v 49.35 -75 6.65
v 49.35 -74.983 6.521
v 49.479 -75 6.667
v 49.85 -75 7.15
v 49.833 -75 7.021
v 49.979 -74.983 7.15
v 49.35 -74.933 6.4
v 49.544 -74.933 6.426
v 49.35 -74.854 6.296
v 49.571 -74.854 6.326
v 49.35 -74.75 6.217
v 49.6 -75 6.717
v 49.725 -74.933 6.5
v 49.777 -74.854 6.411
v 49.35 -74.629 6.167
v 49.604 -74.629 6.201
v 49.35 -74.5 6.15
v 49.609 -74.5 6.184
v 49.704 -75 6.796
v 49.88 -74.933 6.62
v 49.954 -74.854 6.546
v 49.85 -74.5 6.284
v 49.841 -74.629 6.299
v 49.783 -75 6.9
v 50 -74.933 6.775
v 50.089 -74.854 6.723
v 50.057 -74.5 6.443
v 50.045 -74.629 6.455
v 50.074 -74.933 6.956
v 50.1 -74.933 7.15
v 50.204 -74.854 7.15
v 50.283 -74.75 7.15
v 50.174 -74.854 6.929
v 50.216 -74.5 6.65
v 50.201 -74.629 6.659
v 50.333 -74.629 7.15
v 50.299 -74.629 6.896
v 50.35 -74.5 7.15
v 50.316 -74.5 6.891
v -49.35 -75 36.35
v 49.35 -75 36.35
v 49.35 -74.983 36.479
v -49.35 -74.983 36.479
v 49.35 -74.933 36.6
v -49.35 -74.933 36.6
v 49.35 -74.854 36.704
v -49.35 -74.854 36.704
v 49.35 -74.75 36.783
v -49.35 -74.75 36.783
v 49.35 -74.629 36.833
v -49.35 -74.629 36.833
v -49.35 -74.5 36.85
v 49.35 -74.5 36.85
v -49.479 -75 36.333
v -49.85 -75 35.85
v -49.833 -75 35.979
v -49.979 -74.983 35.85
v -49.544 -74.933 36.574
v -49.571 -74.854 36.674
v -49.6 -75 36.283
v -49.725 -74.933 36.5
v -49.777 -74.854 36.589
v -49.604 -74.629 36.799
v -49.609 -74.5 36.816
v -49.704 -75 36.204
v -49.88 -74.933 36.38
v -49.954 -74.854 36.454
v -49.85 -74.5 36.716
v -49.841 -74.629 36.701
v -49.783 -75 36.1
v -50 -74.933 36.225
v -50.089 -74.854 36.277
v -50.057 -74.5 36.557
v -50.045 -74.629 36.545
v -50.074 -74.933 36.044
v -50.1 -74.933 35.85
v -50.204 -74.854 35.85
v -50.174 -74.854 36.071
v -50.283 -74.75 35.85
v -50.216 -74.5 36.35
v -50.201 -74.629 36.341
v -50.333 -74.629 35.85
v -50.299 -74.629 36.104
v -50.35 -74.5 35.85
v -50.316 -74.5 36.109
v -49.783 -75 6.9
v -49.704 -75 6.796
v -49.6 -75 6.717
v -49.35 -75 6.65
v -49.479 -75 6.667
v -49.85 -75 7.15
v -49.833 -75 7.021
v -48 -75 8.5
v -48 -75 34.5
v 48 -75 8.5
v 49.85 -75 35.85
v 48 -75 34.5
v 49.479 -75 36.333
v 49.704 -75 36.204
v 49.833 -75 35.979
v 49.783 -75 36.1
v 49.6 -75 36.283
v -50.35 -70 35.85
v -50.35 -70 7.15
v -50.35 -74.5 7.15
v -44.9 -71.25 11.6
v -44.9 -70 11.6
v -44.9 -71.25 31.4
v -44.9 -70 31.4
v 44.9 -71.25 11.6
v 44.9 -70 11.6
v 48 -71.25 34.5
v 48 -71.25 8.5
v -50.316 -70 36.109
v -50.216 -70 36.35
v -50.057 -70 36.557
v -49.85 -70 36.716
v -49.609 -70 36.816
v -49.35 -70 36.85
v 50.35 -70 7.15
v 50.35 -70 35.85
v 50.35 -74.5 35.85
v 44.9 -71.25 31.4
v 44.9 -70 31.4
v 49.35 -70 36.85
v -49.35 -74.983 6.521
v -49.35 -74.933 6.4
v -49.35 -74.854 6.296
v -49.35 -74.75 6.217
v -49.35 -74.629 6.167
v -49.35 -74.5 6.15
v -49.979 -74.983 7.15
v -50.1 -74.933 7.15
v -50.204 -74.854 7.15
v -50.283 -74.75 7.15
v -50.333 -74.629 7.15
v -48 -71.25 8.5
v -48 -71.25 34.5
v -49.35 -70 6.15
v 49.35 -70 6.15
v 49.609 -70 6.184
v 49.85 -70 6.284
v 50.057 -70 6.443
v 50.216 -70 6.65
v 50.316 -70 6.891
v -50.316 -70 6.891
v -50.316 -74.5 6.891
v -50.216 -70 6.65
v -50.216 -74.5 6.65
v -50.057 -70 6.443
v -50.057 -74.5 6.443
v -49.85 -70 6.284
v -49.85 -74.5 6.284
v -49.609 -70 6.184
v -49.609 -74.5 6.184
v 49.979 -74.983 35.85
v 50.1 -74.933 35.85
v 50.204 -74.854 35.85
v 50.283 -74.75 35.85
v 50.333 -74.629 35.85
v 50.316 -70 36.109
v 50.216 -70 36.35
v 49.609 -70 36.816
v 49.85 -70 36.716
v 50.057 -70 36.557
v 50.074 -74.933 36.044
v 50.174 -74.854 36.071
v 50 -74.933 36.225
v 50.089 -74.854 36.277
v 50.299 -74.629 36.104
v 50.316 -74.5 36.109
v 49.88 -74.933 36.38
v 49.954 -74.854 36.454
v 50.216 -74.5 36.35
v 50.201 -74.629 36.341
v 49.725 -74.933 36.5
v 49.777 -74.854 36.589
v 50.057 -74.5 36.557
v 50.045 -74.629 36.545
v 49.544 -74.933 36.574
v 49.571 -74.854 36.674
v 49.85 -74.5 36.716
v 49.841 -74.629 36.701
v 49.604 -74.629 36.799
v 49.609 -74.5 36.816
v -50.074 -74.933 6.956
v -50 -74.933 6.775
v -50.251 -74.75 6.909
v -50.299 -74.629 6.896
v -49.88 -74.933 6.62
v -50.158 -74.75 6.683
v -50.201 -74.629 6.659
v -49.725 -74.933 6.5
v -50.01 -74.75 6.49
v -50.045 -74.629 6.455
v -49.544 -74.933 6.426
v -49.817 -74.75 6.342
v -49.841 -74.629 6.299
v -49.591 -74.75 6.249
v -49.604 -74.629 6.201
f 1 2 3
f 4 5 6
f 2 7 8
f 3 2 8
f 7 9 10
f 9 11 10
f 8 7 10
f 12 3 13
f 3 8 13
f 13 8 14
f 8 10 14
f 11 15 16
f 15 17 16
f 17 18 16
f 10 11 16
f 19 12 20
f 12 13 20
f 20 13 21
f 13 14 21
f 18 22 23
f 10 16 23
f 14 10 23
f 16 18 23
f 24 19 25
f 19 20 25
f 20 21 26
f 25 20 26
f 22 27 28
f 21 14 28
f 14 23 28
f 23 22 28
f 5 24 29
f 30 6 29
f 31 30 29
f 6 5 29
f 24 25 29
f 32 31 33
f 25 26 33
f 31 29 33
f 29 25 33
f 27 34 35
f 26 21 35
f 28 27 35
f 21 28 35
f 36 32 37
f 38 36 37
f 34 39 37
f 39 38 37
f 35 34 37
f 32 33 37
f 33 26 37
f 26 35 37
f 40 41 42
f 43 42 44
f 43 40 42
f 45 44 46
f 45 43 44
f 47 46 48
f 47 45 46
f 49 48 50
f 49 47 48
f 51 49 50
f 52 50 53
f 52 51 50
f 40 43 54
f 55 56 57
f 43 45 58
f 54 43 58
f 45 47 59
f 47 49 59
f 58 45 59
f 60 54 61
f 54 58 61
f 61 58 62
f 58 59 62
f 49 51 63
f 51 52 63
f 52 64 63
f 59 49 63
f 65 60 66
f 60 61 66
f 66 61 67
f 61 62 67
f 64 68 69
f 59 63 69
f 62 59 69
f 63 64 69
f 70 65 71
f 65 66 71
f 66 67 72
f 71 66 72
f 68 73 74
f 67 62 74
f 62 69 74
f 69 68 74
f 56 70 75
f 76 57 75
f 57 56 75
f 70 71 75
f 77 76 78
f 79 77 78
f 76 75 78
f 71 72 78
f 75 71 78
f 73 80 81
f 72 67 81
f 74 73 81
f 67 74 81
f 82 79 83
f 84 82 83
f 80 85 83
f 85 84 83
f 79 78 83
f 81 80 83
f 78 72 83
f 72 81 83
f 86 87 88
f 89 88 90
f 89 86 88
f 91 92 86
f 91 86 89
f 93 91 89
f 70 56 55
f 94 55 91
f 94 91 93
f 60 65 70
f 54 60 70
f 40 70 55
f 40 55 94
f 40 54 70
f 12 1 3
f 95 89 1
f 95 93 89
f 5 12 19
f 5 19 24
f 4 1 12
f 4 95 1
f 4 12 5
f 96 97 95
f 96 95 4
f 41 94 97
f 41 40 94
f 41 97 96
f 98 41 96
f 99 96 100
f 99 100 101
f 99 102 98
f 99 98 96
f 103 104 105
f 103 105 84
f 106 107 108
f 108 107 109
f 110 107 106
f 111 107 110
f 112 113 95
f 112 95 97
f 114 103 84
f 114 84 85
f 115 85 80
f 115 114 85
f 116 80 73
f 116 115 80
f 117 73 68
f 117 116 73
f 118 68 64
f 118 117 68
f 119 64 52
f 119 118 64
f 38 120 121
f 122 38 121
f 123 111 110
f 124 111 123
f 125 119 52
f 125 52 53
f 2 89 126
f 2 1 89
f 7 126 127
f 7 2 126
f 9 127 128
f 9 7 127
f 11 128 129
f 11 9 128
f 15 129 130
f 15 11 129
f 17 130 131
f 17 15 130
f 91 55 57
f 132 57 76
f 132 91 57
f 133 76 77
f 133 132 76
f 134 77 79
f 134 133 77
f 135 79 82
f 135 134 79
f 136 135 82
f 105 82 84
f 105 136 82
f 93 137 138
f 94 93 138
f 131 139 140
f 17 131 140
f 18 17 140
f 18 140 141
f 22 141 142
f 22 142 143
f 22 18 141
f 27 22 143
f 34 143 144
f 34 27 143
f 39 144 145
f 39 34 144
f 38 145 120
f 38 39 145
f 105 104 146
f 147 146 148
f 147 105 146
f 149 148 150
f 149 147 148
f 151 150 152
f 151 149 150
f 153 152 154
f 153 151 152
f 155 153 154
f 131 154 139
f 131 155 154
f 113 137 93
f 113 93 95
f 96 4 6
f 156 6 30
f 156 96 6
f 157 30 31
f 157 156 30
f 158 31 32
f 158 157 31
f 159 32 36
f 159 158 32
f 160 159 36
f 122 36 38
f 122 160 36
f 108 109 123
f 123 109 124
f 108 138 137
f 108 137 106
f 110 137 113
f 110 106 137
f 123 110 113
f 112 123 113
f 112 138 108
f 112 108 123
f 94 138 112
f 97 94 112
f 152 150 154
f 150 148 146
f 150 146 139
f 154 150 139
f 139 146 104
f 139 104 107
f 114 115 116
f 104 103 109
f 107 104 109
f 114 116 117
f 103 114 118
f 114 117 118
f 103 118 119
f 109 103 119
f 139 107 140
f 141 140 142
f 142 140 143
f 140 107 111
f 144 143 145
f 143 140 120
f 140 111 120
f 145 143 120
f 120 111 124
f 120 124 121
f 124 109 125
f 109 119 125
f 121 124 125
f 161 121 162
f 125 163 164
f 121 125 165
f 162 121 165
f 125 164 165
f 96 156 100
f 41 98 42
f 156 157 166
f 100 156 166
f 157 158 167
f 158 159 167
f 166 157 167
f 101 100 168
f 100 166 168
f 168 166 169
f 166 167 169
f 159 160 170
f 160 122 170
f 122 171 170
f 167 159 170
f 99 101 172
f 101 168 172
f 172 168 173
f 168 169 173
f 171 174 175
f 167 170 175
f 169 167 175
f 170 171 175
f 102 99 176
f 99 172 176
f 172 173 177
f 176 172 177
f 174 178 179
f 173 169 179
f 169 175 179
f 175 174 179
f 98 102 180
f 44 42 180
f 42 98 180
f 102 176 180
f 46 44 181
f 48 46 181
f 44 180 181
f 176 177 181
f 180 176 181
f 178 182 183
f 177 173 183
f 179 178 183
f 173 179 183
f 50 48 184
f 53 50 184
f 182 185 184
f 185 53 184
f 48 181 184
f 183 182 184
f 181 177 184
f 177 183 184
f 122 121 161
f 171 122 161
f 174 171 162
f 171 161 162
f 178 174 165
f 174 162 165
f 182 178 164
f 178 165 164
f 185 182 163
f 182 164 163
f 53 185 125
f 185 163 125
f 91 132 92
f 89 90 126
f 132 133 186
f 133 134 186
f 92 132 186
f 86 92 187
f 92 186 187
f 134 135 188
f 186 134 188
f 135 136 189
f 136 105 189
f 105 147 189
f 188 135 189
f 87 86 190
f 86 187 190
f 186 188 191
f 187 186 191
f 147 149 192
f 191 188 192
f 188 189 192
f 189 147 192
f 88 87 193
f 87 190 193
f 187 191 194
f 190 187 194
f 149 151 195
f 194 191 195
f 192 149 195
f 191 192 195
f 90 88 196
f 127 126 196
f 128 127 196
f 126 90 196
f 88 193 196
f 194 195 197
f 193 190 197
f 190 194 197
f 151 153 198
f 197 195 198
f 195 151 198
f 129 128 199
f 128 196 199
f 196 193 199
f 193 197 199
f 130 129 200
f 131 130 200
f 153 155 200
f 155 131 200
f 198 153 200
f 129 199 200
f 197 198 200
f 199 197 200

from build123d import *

# Parameters (mm, degrees)
SKETCH051_W   = 100.7
SKETCH051_H   = 30.7
SKETCH051_W_2 = 89.8
SKETCH051_H_2 = 19.8
PAD022_DEPTH  = 1.25
SKETCH052_W   = 100.7
SKETCH052_H   = 30.7
SKETCH052_W_2 = 96
SKETCH052_H_2 = 26
PAD023_DEPTH  = 3.75
FILLET_R      = 1
FILLET005_R   = 0.5


with BuildPart() as part:
    # Sketch051 → Pad022 (new body)
    with BuildSketch(Plane.XZ):
        with Locations((0, 21.5)):
            Rectangle(SKETCH051_W, SKETCH051_H)
        with Locations((0, 21.5)):
            Rectangle(SKETCH051_W_2, SKETCH051_H_2, mode=Mode.SUBTRACT)
    extrude(amount=PAD022_DEPTH)

    # Sketch052 (on Face10 of Pad022) → Pad023 (join)
    with BuildSketch(Plane.XZ.offset(1.25)):
        with Locations((0, 21.5)):
            Rectangle(SKETCH052_W, SKETCH052_H)
        with Locations((0, 21.5)):
            Rectangle(SKETCH052_W_2, SKETCH052_H_2, mode=Mode.SUBTRACT)
    extrude(amount=PAD023_DEPTH)

    # Fillet
    fillet_edges = [part.edges().sort_by_distance(p)[0] for p in [
        (-50.35, -3.125, 36.85),
        (-50.35, -3.125, 6.15),
        (50.35, -3.125, 36.85),
        (50.35, -3.125, 6.15),
    ]]
    fillet(fillet_edges, radius=FILLET_R)

    # Fillet005
    fillet005_edges = [part.edges().sort_by_distance(p)[0] for p in [
        (0, -5, 6.15),
    ]]
    fillet(fillet005_edges, radius=FILLET005_R)


with BuildPart() as part_1:
    # Body011 placement: moved
    add(part.part.moved(Location((0, -70, 0))))


solid = part_1.part
